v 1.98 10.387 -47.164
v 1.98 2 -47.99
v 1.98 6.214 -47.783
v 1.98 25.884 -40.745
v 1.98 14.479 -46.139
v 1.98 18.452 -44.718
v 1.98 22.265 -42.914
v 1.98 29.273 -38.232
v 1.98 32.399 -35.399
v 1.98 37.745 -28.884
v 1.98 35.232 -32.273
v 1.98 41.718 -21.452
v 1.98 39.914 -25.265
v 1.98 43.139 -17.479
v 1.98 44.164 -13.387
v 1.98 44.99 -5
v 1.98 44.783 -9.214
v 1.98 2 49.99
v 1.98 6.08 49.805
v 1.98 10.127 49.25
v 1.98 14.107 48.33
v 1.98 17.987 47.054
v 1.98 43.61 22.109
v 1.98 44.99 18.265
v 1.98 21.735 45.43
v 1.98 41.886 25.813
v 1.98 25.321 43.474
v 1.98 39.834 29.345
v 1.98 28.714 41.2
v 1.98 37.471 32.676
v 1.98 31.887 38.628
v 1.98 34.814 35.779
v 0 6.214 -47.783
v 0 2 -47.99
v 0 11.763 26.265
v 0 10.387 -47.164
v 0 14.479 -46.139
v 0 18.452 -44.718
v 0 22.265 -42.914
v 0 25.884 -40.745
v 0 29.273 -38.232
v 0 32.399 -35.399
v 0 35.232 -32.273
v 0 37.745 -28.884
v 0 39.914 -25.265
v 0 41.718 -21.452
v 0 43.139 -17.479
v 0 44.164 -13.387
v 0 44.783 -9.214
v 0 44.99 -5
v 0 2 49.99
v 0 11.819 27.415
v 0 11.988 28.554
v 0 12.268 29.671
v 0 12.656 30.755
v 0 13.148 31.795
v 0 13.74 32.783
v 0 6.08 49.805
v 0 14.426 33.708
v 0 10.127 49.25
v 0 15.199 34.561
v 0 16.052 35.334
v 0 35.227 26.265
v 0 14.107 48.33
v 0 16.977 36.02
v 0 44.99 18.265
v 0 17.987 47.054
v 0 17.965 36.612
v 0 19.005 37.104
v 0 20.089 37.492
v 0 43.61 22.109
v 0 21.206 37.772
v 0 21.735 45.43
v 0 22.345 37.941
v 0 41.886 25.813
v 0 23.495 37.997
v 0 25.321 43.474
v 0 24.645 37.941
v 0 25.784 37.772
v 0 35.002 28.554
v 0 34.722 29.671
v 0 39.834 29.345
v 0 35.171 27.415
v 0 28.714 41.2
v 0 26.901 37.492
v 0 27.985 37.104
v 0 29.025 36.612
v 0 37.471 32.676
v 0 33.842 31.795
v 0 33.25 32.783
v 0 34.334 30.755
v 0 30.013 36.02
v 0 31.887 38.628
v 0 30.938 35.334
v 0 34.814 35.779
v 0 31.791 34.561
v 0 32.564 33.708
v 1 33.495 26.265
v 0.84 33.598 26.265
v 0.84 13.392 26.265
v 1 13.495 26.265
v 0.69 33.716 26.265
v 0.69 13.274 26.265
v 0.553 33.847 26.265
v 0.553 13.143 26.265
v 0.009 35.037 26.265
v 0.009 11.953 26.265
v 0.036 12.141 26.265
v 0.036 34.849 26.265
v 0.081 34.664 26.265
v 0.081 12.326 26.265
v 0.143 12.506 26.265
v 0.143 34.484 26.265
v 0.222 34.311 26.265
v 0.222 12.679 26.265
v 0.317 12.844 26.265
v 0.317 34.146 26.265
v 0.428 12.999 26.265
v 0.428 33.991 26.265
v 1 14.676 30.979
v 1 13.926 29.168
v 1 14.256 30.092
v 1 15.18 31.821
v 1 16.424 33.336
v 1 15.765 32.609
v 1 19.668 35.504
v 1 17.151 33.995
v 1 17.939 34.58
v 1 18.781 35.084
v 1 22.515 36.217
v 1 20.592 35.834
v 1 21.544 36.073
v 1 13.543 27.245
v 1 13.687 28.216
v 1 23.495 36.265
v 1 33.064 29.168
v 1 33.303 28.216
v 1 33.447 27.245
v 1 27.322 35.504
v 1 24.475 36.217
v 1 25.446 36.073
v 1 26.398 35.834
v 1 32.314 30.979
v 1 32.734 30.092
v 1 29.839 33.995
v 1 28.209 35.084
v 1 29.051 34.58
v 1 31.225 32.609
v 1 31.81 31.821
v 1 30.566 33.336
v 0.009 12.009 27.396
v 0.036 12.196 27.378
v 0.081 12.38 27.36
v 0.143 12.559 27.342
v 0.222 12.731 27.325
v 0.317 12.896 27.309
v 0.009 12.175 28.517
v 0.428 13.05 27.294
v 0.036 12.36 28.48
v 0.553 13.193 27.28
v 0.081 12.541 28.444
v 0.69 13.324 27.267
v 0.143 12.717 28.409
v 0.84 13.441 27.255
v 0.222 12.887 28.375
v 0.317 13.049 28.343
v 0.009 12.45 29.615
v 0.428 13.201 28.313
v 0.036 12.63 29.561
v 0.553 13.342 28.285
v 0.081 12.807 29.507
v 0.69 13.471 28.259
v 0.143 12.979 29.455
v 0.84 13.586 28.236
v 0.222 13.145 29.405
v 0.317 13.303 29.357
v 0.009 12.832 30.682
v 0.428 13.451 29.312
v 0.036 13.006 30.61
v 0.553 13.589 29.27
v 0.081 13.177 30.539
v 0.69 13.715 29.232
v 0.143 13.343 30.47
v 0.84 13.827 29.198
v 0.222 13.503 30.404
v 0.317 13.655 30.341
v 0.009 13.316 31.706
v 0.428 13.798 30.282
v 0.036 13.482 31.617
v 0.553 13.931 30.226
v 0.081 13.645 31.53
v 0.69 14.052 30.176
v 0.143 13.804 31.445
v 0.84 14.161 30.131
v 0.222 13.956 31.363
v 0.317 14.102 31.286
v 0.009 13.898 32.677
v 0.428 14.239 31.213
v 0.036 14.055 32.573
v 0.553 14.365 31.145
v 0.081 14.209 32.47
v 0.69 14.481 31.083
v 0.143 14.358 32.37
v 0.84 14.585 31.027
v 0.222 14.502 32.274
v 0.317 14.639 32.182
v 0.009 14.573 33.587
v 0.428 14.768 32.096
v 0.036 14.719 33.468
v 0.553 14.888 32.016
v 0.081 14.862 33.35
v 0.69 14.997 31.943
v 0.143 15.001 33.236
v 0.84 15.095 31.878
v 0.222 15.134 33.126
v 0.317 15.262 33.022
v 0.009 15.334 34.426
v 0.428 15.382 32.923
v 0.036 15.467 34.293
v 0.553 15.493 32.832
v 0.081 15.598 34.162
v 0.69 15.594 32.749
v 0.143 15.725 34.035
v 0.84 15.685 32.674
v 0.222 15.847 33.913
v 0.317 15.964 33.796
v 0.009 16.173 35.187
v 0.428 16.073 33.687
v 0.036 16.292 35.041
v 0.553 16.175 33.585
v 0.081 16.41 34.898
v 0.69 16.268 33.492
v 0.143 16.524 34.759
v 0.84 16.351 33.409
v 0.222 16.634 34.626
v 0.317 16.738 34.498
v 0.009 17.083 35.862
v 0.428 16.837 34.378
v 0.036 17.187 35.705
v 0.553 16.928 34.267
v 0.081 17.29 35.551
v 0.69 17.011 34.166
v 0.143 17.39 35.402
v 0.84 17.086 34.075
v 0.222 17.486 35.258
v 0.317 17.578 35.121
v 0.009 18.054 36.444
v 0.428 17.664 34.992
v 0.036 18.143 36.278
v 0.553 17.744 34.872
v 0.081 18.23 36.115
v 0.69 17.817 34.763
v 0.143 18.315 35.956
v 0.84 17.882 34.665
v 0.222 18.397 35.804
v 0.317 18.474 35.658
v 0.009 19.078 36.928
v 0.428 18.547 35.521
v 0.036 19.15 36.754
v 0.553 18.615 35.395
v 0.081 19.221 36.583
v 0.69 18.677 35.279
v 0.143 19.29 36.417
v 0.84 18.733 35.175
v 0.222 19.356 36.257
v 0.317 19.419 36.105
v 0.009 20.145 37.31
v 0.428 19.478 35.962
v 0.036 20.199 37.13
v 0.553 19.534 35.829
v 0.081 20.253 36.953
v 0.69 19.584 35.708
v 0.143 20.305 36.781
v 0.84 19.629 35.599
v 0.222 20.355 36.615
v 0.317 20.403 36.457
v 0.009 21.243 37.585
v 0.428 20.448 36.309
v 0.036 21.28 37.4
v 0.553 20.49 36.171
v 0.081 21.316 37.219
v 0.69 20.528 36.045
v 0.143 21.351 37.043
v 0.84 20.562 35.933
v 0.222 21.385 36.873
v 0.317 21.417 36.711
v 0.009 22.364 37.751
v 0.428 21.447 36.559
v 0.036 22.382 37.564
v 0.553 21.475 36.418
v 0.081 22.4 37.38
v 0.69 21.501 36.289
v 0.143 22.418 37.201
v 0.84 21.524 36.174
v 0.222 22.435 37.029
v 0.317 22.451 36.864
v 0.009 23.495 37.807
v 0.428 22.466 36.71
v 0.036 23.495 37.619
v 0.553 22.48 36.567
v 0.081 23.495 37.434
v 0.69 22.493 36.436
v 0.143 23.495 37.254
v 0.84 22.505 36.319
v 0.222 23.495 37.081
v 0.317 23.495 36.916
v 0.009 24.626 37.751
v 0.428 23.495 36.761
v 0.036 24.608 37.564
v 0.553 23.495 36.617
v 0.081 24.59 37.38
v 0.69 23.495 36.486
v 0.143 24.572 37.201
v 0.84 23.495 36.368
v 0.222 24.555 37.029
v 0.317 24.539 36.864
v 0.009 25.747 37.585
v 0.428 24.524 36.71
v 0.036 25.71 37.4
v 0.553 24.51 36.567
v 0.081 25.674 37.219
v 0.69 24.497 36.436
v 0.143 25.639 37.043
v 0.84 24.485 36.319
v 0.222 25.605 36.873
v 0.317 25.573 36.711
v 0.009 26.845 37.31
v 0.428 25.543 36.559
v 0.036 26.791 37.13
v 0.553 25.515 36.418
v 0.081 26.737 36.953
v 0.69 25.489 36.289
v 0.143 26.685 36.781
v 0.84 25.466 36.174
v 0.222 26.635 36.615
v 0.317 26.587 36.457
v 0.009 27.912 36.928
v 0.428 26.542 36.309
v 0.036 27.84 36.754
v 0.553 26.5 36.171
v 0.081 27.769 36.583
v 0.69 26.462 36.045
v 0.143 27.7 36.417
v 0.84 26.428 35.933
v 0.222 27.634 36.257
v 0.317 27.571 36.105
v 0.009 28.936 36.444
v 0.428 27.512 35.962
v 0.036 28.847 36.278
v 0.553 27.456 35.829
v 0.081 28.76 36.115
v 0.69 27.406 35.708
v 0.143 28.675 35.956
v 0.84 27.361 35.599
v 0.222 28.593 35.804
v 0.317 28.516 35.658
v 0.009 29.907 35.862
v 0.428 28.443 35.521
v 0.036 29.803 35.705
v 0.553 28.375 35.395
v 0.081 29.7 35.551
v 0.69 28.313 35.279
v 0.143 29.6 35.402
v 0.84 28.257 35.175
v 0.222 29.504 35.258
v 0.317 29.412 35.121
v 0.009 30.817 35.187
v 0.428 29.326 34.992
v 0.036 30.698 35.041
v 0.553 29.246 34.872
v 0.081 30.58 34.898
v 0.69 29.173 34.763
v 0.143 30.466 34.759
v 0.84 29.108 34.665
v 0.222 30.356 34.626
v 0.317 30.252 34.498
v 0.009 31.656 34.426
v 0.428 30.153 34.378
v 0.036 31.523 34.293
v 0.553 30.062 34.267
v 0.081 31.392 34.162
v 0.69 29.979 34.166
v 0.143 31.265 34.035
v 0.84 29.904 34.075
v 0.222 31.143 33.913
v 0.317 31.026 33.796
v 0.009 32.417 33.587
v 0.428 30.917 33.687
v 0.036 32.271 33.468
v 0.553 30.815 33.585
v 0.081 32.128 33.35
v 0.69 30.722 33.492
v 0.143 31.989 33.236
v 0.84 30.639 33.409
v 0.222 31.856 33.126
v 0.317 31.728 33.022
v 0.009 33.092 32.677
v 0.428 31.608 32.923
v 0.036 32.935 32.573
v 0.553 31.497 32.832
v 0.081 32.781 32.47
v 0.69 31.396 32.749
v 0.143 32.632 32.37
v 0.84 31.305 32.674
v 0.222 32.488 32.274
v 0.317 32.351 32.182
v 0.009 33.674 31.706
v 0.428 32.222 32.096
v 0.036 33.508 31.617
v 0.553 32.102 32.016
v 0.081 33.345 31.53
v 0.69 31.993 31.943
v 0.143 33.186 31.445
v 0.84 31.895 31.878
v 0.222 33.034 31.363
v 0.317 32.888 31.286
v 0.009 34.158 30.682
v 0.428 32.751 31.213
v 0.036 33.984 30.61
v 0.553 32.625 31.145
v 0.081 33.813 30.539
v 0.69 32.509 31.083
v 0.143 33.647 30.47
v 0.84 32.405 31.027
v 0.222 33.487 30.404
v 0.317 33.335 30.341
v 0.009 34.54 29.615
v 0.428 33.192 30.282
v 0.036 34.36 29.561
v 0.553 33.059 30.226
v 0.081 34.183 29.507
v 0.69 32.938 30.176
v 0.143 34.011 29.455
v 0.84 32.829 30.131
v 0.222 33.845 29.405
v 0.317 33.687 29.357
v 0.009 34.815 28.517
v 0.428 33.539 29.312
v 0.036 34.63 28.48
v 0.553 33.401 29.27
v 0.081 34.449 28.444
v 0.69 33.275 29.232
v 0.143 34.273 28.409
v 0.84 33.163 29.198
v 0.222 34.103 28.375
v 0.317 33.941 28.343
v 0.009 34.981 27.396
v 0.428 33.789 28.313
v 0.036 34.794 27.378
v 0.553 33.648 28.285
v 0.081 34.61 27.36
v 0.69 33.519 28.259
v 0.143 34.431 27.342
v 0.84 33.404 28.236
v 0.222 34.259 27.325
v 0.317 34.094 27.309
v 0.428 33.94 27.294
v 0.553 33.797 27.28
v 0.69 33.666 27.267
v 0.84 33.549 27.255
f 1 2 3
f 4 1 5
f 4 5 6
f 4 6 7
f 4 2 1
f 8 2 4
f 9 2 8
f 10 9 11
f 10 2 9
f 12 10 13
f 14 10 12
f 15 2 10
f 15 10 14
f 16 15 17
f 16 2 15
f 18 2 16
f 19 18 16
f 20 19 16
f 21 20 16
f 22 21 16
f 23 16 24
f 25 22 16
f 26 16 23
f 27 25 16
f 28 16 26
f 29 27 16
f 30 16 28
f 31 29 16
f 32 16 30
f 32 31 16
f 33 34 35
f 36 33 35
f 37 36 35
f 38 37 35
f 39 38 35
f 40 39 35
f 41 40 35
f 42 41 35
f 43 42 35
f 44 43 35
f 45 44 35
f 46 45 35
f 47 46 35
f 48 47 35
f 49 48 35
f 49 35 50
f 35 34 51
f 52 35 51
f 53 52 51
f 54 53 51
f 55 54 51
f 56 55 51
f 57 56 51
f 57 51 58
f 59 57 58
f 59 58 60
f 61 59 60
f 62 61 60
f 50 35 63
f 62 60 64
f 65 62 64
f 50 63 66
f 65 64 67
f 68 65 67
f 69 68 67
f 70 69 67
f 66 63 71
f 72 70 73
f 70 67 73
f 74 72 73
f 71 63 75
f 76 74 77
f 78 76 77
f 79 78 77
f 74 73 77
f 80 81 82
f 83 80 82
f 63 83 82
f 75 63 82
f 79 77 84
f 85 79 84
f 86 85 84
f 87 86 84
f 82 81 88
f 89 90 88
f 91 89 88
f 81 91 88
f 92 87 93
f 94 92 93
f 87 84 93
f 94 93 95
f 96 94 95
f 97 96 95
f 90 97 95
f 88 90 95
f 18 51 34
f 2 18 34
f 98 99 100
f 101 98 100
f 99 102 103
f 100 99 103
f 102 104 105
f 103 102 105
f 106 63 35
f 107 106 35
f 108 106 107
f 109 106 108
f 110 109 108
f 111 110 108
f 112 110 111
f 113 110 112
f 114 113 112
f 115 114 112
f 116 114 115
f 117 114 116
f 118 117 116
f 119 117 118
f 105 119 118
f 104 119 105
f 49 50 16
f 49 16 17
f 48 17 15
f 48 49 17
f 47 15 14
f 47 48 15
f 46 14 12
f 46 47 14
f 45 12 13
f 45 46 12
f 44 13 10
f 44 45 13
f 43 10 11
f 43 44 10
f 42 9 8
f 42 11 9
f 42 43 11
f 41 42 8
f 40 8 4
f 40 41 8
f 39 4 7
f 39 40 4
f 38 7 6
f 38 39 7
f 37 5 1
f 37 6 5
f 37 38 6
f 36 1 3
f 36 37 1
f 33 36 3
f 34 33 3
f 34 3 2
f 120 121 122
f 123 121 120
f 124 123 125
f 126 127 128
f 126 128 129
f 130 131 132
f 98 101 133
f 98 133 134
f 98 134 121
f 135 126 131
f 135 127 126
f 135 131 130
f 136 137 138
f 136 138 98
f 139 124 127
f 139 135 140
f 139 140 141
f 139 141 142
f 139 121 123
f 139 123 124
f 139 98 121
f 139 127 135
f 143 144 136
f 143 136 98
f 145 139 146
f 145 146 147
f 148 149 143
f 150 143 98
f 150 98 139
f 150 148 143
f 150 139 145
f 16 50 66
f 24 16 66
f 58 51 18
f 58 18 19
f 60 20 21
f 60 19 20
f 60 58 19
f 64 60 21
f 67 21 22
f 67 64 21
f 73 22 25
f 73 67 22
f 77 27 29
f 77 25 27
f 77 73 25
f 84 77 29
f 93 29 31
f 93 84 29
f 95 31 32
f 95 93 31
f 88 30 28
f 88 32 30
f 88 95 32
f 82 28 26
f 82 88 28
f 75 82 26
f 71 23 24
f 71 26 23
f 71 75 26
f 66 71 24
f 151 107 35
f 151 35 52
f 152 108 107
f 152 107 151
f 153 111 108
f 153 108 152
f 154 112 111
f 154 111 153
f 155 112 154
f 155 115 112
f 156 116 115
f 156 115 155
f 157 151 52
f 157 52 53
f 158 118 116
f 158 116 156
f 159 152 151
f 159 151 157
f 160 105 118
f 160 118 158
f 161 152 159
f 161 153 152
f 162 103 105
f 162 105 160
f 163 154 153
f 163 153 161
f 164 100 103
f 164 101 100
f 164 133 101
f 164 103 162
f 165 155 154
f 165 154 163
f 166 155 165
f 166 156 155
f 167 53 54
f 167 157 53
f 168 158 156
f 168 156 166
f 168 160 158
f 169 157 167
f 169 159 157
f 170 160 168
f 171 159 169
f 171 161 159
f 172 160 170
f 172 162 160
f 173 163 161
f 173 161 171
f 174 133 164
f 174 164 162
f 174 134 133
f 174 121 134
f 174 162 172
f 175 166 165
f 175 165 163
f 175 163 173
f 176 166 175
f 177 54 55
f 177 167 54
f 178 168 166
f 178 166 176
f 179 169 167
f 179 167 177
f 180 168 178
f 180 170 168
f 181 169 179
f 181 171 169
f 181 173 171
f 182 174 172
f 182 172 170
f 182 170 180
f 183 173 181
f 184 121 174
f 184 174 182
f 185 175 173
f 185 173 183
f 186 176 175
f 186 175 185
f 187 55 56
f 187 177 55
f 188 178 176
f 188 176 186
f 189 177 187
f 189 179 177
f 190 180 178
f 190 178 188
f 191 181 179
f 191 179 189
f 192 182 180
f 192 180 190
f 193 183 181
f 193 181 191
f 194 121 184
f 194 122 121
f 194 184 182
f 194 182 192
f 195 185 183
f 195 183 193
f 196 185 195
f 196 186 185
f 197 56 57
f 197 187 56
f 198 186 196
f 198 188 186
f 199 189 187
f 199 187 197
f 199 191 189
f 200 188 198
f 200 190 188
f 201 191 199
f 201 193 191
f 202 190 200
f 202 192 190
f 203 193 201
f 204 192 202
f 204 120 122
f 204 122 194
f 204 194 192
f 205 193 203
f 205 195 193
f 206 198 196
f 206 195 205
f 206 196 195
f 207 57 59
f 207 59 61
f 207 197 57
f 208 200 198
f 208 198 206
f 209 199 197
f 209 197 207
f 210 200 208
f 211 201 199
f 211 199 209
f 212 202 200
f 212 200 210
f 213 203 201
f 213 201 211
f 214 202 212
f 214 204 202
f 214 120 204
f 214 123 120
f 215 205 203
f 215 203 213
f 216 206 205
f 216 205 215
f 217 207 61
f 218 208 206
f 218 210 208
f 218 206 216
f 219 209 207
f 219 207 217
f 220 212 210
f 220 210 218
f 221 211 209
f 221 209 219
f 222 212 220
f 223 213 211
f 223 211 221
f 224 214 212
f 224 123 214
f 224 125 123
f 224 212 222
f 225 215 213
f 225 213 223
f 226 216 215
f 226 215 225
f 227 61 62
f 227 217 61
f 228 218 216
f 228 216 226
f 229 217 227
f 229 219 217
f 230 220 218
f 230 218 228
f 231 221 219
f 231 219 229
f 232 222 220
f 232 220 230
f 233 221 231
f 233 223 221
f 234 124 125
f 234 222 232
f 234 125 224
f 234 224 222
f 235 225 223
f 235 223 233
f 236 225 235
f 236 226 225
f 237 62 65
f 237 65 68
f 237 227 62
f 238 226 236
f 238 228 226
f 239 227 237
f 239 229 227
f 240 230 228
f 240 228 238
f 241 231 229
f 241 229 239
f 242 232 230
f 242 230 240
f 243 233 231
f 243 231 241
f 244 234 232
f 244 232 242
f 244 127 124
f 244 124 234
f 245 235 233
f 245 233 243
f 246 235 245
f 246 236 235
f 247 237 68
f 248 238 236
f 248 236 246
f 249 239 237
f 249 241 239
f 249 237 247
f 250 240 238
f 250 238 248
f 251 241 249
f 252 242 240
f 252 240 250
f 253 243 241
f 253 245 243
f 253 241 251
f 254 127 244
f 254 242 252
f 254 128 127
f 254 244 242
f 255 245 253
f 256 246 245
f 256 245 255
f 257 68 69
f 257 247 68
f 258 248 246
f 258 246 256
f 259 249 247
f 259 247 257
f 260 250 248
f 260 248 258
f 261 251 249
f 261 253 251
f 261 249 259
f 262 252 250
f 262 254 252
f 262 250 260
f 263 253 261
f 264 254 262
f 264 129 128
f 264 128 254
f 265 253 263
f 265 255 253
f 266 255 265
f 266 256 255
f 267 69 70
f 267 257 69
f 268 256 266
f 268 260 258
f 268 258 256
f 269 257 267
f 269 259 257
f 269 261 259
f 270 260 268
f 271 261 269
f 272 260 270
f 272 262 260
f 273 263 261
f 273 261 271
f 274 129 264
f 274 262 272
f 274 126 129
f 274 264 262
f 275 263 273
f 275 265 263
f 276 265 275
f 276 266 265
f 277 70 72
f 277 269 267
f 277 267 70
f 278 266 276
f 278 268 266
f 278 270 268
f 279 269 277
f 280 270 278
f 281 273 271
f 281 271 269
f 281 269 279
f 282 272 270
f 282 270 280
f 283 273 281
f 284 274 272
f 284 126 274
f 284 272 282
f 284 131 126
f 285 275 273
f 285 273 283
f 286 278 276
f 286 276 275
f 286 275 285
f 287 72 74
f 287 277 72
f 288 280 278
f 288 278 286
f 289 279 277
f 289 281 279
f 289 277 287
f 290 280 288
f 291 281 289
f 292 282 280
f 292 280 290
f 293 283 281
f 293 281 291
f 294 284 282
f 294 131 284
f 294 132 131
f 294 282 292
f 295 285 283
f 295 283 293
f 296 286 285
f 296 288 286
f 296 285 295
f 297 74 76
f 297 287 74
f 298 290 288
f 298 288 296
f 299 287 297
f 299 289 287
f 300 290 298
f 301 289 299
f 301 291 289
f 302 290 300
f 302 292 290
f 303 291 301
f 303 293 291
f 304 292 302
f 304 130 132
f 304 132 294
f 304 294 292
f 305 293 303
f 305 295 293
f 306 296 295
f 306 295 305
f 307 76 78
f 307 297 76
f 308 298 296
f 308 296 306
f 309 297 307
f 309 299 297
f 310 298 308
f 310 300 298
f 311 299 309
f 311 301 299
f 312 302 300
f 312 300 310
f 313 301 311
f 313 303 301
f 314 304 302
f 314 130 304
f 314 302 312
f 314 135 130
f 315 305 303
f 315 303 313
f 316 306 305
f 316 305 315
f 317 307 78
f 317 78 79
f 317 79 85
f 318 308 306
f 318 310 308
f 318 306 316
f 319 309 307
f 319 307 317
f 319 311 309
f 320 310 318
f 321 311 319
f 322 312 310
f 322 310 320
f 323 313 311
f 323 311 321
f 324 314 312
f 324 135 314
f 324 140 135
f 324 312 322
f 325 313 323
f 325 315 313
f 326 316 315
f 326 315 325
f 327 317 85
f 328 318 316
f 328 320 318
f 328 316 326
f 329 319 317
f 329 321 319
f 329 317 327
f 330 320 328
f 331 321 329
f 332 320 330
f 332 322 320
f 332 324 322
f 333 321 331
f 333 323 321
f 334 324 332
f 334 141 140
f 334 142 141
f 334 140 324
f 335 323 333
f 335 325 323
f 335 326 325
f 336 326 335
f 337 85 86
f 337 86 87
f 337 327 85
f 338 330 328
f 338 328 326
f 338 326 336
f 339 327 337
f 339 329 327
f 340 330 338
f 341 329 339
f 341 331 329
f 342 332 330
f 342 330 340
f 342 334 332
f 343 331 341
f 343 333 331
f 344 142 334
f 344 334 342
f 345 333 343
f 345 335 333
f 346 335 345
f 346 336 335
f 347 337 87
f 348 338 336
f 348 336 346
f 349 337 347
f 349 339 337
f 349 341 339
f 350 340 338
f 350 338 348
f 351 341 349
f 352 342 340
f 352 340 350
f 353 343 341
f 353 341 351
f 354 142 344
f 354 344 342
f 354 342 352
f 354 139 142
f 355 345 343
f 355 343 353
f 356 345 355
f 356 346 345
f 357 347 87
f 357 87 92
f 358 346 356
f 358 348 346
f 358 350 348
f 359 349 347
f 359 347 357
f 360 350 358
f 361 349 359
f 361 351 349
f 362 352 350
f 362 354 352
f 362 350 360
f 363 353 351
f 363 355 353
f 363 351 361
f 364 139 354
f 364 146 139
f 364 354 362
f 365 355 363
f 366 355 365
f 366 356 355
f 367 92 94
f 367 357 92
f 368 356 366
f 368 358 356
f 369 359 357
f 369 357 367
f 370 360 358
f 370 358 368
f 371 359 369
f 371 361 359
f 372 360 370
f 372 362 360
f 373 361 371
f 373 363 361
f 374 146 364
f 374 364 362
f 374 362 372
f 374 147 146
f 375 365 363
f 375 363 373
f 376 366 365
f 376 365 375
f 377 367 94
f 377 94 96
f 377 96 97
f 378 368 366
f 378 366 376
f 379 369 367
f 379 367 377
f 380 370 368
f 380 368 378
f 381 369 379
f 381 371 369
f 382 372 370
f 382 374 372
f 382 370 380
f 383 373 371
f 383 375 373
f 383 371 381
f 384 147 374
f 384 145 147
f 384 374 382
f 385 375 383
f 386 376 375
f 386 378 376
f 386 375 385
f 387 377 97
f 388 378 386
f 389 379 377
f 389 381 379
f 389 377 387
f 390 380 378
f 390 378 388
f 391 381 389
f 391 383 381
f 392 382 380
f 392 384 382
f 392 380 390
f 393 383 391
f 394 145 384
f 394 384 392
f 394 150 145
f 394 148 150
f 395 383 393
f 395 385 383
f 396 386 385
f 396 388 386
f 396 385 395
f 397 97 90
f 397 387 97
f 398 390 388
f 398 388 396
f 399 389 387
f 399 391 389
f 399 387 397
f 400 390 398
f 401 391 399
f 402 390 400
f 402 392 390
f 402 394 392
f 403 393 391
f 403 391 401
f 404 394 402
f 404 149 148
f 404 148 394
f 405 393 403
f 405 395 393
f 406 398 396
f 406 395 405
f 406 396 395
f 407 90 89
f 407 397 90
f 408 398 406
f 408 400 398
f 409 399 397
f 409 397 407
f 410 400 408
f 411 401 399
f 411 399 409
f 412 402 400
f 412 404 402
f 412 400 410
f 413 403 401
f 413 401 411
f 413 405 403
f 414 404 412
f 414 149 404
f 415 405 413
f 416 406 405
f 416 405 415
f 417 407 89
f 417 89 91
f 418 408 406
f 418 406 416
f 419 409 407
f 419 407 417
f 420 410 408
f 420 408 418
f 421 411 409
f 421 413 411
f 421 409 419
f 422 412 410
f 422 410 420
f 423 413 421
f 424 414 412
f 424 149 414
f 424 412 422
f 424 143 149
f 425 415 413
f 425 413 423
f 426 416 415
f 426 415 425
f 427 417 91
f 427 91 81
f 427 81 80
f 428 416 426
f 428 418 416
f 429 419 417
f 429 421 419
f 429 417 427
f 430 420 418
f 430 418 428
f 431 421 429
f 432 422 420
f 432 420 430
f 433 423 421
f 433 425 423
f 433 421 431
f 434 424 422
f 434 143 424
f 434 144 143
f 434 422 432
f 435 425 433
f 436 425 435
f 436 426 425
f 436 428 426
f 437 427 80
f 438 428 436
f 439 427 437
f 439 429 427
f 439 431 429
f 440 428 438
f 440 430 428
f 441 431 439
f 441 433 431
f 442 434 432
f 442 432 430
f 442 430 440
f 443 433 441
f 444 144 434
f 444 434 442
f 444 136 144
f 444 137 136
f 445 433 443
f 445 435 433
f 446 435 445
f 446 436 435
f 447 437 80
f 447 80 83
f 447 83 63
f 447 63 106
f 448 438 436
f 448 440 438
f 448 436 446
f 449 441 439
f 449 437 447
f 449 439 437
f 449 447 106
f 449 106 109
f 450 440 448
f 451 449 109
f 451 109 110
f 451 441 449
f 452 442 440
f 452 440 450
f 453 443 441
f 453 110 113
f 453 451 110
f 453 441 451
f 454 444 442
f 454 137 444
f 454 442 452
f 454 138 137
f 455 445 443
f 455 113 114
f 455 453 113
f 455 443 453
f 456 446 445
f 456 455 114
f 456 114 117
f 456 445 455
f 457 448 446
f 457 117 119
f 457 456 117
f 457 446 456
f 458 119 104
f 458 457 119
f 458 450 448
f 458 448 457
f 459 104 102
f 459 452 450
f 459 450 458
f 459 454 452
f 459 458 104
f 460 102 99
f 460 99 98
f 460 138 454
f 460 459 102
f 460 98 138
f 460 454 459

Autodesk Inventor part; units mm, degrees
ref_plane "YZ Plane" through (0, 0, 0) normal (1, 0, 0) x (0, 1, 0)
ref_plane "XZ Plane" through (0, 0, 0) normal (0, 1, 0) x (-1, 0, 0)
ref_plane "XY Plane" through (0, 0, 0) normal (0, 0, 1) x (1, 0, 0)
sketch "Sketch1" plane through (0, 0, 0) normal (1, 0, 0) x (0, 1, 0)
  line L0 (0, 49.99) -> (2, 49.99) construction
  line L1 (2, 49.99) -> (2, -49.99) construction
  line L2 (2, -49.99) -> (0, -49.99) construction
  line L3 (0, 49.99) -> (0, 0) construction
  line L4 (0, 0) -> (0, -49.99) construction
  arc A0 (46.99, 5) -> (2, 49.99) centre (2, 5) ccw construction
  arc A1 (2, -49.99) -> (46.99, -5) centre (2, -5) ccw construction
  line L5 (46.99, 5) -> (46.99, -5) construction
  arc A2 (2, -47.99) -> (44.99, -5) centre (2, -5) ccw construction
  line L6 (44.99, -5) -> (44.99, 5) construction
  arc A3 (44.99, 5) -> (2, 47.99) centre (2, 5) ccw construction
  line L7 (44.99, 5) -> (44.99, 49.99) construction
  dimension "d0" = 99.98
  dimension "d1" = 2
  dimension "d2" = 10
  dimension "d3" = 2
  dimension "d4" = 2
sketch "Sketch2" plane through (0, 0, 0) normal (1, 0, 0) x (0, 1, 0)
  line L0 (0, 49.99) -> (2, 49.99) construction
  line L1 (2, 49.99) -> (2, -49.99) construction
  line L2 (2, -49.99) -> (0, -49.99) construction
  line L3 (0, 49.99) -> (0, 0) construction
  line L4 (0, 0) -> (0, -49.99) construction
  arc A0 (46.99, 5) -> (2, 49.99) centre (2, 5) ccw construction
  arc A1 (2, -49.99) -> (46.99, -5) centre (2, -5) ccw construction
  line L5 (46.99, 5) -> (46.99, -5) construction
  arc A2 (2, -47.99) -> (44.99, -5) centre (2, -5) ccw construction
  line L6 (44.99, -5) -> (44.99, 5) construction
  arc A3 (44.99, 5) -> (2, 47.99) centre (2, 5) ccw construction
  line L7 (44.99, 5) -> (44.99, 49.99) construction
  line L8 (2, 49.99) -> (2, -47.99)
  arc A4 (2, -47.99) -> (44.99, -5) centre (2, -5) ccw
  line L9 (44.99, -5) -> (44.99, 18.265)
  arc A5 (44.99, 18.265) -> (2, 49.99) centre (2, 5) ccw
extrude "Extrusion1" add sketch "Sketch2" along normal blind 1.98
sketch "Sketch3" plane through (0, 0, 0) normal (-1, 0, 0) x (0, 0, 1)
  line L0 (26.265, 33.495) -> (26.265, 13.495)
  arc A0 (26.265, 13.495) -> (26.265, 33.495) centre (26.265, 23.495) ccw
  line L1 (-5, 44.99) -> (18.265, 44.99) projected
  line L2 (18.265, 44.99) -> (18.265, 23.495)
  line L3 (18.265, 23.495) -> (18.265, 2)
  line L4 (49.99, 2) -> (-47.99, 2) projected
  point P0 (0, 0)
  dimension "d7" = 20
  dimension "d8" = 8
extrude "Extrusion2" cut sketch "Sketch3" against normal blind 1
fillet "Fillet1" radius 2 1 edges at (0, 23.495, 36.265)
properties part number "BuddyRobotBaseDoor"
